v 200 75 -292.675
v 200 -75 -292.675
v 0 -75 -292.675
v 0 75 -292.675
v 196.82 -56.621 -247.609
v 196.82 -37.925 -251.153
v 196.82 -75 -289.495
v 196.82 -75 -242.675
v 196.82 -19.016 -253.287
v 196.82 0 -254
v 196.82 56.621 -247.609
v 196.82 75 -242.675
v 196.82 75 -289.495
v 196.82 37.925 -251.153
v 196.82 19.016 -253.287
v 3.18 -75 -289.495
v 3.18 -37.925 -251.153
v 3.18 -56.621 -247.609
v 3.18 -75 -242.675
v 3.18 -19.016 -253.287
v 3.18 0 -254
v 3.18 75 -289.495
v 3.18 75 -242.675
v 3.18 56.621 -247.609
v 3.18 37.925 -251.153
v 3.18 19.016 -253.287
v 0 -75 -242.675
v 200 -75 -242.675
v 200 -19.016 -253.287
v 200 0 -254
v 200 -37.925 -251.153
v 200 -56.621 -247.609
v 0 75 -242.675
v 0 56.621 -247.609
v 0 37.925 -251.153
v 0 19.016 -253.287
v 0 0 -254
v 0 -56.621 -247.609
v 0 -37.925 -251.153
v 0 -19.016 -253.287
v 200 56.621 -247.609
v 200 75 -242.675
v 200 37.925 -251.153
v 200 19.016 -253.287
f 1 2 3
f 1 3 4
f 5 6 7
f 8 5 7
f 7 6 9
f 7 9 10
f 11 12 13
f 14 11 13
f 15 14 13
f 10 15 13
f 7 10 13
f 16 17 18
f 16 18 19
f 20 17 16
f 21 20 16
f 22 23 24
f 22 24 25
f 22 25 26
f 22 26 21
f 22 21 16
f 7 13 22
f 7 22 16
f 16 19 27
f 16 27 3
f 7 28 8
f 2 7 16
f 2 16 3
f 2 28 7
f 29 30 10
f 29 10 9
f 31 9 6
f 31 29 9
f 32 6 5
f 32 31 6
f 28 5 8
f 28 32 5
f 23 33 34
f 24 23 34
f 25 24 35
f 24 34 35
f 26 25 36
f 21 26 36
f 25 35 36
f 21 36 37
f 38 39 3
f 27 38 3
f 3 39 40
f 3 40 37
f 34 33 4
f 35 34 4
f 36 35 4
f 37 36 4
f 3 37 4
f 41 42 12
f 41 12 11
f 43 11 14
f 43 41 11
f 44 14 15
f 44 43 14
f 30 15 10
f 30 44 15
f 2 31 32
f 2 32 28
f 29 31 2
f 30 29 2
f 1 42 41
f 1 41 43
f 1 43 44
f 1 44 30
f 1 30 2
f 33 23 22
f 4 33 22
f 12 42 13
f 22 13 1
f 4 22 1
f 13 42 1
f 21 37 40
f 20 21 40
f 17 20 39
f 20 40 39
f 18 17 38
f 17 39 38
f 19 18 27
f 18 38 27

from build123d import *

# Parameters (mm, degrees)
BOSS_EXTRUDE3_DEPTH = 3.18
SKETCH1_5_W         = 3.18
SKETCH1_5_H         = 150
BOSS_EXTRUDE4_DEPTH = 100


with BuildPart() as part:
    # Sketch1 → Boss-Extrude3 (new body)
    with BuildSketch(Plane(origin=(0, 0, 0), x_dir=(0, 0, -1), z_dir=(1, 0, 0))):
        with BuildLine():
            Line((289.494679355, 75), (242.674679355, 75))
            ThreePointArc((242.674679355, 75), (254, 0), (242.674679355, -75))
            Line((242.674679355, -75), (289.494679355, -75))
            Line((289.494679355, -75), (289.494679355, 75))
        make_face()
    extrude(amount=BOSS_EXTRUDE3_DEPTH)

    # Sketch1<5> → Boss-Extrude4 (add)
    with BuildSketch(Plane(origin=(0, 0, 0), x_dir=(0, 0, -1), z_dir=(1, 0, 0))):
        with Locations((291.084679355, 0)):
            Rectangle(SKETCH1_5_W, SKETCH1_5_H)
    extrude(amount=BOSS_EXTRUDE4_DEPTH)

    # Mirror2: part across plane


with BuildPart() as part_1:
    add(part.part)
    add(part.part.mirror(Plane(origin=(100, 0, 0), x_dir=(0, 0, 1), z_dir=(1, 0, 0))))


solid = part_1.part
